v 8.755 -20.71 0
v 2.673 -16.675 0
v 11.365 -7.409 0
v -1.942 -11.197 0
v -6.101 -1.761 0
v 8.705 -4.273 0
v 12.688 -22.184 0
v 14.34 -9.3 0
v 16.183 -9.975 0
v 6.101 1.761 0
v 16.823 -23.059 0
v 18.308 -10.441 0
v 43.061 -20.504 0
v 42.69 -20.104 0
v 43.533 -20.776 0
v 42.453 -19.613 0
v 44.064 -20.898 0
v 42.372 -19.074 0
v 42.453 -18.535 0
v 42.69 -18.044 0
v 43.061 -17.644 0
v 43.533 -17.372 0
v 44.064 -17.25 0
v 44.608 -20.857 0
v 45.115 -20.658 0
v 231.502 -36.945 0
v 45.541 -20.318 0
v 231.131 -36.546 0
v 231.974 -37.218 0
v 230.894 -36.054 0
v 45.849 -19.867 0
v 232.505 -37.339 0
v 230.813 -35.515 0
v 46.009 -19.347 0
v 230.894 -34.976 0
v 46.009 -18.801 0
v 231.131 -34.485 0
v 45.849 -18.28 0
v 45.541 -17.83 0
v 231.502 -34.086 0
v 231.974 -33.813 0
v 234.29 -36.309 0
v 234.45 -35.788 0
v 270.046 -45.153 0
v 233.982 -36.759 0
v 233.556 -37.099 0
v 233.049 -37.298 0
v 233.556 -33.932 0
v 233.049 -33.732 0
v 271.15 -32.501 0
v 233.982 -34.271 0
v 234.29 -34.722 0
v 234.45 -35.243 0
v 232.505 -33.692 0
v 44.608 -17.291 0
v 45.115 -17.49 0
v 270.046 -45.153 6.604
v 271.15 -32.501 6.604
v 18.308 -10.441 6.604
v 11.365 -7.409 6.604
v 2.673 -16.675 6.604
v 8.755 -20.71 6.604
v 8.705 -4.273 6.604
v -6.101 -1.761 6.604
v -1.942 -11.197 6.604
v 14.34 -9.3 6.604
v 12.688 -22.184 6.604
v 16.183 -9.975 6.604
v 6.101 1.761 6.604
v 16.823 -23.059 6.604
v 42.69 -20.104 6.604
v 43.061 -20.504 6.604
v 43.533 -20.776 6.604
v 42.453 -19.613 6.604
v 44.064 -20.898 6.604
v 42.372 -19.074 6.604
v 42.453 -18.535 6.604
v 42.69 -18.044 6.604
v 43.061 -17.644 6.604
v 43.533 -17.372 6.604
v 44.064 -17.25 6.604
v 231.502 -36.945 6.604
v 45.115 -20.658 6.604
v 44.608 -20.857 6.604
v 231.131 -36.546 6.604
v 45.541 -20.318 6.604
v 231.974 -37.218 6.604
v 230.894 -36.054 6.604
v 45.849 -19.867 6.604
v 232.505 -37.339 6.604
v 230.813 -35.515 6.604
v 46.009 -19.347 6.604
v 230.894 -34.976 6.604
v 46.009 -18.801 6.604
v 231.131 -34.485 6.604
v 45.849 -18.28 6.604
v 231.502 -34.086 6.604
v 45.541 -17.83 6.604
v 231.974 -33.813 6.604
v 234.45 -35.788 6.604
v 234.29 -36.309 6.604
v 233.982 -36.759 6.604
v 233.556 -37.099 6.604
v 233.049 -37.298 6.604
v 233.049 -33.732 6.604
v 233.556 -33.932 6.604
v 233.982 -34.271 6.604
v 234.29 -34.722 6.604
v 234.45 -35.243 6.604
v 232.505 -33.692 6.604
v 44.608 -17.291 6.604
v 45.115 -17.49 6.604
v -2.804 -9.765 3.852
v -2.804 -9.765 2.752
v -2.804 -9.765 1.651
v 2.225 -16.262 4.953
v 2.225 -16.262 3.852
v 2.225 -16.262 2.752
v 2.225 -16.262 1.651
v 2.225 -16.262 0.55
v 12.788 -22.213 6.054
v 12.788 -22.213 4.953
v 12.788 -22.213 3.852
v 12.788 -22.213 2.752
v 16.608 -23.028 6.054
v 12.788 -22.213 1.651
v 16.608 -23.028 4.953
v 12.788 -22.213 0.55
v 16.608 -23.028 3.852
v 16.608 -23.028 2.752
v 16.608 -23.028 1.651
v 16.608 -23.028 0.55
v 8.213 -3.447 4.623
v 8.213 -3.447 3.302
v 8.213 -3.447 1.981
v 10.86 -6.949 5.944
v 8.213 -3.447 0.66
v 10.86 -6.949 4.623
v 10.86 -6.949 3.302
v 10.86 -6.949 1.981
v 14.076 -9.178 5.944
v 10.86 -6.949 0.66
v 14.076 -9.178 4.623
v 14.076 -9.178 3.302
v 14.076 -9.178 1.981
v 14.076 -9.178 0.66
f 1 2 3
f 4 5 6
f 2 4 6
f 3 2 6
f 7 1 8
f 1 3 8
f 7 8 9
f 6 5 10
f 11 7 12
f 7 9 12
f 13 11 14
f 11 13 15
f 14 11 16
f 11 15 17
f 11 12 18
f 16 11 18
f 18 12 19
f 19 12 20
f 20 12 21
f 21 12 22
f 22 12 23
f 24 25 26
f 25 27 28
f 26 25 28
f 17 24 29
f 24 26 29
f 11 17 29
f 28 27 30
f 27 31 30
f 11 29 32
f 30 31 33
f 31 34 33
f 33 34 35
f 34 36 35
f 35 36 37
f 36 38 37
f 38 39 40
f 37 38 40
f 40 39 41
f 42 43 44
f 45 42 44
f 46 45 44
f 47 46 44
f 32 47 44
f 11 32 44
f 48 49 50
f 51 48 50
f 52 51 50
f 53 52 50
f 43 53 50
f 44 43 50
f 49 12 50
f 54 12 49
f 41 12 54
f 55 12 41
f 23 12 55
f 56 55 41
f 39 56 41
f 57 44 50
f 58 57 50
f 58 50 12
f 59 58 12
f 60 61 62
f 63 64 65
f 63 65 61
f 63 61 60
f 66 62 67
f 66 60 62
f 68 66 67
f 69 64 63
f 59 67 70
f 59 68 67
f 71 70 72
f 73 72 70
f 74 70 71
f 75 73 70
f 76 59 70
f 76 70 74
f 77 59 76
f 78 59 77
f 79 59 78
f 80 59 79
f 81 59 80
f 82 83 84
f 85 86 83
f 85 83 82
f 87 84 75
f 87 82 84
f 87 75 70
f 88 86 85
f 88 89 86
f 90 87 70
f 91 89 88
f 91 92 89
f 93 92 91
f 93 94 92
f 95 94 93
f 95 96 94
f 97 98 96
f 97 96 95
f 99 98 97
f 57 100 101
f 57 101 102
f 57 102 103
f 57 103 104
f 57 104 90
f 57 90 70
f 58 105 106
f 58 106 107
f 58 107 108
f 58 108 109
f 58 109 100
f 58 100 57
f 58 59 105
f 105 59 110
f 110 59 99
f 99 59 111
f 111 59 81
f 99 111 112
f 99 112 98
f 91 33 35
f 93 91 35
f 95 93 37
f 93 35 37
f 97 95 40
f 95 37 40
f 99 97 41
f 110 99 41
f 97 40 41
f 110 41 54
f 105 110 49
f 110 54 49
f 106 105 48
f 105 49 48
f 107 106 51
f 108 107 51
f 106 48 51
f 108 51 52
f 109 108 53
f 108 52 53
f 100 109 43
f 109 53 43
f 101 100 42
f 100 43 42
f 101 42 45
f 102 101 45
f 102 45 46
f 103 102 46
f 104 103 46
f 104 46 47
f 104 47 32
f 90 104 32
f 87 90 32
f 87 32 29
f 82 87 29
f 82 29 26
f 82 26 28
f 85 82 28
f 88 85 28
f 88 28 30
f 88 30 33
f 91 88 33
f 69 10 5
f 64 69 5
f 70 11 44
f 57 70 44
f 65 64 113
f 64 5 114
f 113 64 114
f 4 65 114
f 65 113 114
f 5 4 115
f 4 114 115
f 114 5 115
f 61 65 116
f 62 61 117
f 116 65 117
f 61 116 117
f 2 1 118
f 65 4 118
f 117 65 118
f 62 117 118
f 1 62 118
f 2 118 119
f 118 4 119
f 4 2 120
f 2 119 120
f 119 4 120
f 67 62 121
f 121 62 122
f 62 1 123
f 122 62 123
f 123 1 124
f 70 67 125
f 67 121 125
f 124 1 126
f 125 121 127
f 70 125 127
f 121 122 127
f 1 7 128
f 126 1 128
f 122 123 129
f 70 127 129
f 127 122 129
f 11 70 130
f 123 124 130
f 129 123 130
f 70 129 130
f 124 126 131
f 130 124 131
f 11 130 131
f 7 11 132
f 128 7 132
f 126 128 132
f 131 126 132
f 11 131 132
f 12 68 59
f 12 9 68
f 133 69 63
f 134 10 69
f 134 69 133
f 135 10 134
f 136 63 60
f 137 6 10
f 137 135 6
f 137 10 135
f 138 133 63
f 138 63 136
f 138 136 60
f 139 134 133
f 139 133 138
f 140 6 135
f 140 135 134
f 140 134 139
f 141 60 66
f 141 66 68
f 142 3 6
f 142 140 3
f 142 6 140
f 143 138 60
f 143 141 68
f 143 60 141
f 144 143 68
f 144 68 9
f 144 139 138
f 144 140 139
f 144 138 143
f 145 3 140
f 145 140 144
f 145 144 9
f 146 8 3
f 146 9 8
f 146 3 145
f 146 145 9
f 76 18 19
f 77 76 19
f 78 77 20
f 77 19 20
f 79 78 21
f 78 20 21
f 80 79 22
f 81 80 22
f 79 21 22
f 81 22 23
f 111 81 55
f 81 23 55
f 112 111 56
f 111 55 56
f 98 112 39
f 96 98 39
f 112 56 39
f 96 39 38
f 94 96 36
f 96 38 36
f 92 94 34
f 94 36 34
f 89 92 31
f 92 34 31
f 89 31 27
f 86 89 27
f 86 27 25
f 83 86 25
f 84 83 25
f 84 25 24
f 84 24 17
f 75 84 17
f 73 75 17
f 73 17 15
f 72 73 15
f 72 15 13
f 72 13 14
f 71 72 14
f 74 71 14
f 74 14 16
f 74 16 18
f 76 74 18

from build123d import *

# Parameters (mm, degrees)
BOSS_EXTRUDE1_DEPTH       = 6.604
F_6_CLEARANCE_HOLE1_D     = 3.6576
F_6_CLEARANCE_HOLE1_DEPTH = 10.16
F_6_CLEARANCE_HOLE1_TIP   = 1.0988539


with BuildPart() as part:
    # Sketch1 → Boss-Extrude1 (new body)
    with BuildSketch(Plane.XY):
        with BuildLine():
            Line((16.823092539, -23.059379431), (270.045750863, -45.152940848))
            Line((270.045750863, -45.152940848), (271.149626418, -32.501005867))
            Line((271.149626418, -32.501005867), (18.308001968, -10.440689482))
            add(Edge.make_bspline(
                [(6.100873241, 1.761205752), (6.243998722, 1.265414493), (6.562029623, 0.258197332), (7.239782187, -1.541714319), (8.191856686, -3.521031278), (9.459597024, -5.451591955), (10.839105985, -7.00109828), (12.345816988, -8.235279198), (14.031634784, -9.215214087), (15.656369367, -9.844087266), (17.105920915, -10.226590441), (17.911821211, -10.379141677), (18.308001968, -10.440689482)],
                knots=[0, 0, 0, 0, 0.061967329, 0.123934658, 0.247869317, 0.371803975, 0.495738633, 0.619673292, 0.74360795, 0.867542608, 0.929509938, 0.991477267, 0.991477267, 0.991477267, 0.991477267], degree=3))
            Line((6.100873241, 1.761205752), (-6.100873241, -1.761205752))
            add(Edge.make_bspline(
                [(-6.100873241, -1.761205752), (-5.89459242, -2.475769135), (-5.442695686, -3.905842246), (-4.417225036, -6.62638985), (-2.877642754, -9.827164342), (-0.591083482, -13.296598328), (3.065590072, -17.362765142), (7.603197402, -20.424150011), (12.110004519, -22.072207275), (14.454118771, -22.647767765), (15.661607343, -22.877150547), (16.252804896, -22.974574297), (16.621102903, -23.030106303), (16.751262737, -23.048877832), (16.823092539, -23.059379431)],
                knots=[0, 0, 0, 0, 0.062929816, 0.125859631, 0.251719262, 0.377578894, 0.503438525, 0.755157787, 0.881017419, 0.943947234, 0.975412142, 0.991144596, 0.999010823, 1.00687705, 1.00687705, 1.00687705, 1.00687705], degree=3))
        make_face()
    extrude(amount=BOSS_EXTRUDE1_DEPTH)

    # #6 Clearance Hole1
    with Locations(Plane.XY.offset(6.604)):
        with Locations((232.641883698, -35.515346692), (44.200873241, -19.073954498)):
            Hole(F_6_CLEARANCE_HOLE1_D / 2, depth=F_6_CLEARANCE_HOLE1_DEPTH)
            with Locations((0, 0, -(F_6_CLEARANCE_HOLE1_DEPTH + F_6_CLEARANCE_HOLE1_TIP / 2))):  # 118° drill point
                Cone(0, F_6_CLEARANCE_HOLE1_D / 2, F_6_CLEARANCE_HOLE1_TIP, mode=Mode.SUBTRACT)


solid = part.part
